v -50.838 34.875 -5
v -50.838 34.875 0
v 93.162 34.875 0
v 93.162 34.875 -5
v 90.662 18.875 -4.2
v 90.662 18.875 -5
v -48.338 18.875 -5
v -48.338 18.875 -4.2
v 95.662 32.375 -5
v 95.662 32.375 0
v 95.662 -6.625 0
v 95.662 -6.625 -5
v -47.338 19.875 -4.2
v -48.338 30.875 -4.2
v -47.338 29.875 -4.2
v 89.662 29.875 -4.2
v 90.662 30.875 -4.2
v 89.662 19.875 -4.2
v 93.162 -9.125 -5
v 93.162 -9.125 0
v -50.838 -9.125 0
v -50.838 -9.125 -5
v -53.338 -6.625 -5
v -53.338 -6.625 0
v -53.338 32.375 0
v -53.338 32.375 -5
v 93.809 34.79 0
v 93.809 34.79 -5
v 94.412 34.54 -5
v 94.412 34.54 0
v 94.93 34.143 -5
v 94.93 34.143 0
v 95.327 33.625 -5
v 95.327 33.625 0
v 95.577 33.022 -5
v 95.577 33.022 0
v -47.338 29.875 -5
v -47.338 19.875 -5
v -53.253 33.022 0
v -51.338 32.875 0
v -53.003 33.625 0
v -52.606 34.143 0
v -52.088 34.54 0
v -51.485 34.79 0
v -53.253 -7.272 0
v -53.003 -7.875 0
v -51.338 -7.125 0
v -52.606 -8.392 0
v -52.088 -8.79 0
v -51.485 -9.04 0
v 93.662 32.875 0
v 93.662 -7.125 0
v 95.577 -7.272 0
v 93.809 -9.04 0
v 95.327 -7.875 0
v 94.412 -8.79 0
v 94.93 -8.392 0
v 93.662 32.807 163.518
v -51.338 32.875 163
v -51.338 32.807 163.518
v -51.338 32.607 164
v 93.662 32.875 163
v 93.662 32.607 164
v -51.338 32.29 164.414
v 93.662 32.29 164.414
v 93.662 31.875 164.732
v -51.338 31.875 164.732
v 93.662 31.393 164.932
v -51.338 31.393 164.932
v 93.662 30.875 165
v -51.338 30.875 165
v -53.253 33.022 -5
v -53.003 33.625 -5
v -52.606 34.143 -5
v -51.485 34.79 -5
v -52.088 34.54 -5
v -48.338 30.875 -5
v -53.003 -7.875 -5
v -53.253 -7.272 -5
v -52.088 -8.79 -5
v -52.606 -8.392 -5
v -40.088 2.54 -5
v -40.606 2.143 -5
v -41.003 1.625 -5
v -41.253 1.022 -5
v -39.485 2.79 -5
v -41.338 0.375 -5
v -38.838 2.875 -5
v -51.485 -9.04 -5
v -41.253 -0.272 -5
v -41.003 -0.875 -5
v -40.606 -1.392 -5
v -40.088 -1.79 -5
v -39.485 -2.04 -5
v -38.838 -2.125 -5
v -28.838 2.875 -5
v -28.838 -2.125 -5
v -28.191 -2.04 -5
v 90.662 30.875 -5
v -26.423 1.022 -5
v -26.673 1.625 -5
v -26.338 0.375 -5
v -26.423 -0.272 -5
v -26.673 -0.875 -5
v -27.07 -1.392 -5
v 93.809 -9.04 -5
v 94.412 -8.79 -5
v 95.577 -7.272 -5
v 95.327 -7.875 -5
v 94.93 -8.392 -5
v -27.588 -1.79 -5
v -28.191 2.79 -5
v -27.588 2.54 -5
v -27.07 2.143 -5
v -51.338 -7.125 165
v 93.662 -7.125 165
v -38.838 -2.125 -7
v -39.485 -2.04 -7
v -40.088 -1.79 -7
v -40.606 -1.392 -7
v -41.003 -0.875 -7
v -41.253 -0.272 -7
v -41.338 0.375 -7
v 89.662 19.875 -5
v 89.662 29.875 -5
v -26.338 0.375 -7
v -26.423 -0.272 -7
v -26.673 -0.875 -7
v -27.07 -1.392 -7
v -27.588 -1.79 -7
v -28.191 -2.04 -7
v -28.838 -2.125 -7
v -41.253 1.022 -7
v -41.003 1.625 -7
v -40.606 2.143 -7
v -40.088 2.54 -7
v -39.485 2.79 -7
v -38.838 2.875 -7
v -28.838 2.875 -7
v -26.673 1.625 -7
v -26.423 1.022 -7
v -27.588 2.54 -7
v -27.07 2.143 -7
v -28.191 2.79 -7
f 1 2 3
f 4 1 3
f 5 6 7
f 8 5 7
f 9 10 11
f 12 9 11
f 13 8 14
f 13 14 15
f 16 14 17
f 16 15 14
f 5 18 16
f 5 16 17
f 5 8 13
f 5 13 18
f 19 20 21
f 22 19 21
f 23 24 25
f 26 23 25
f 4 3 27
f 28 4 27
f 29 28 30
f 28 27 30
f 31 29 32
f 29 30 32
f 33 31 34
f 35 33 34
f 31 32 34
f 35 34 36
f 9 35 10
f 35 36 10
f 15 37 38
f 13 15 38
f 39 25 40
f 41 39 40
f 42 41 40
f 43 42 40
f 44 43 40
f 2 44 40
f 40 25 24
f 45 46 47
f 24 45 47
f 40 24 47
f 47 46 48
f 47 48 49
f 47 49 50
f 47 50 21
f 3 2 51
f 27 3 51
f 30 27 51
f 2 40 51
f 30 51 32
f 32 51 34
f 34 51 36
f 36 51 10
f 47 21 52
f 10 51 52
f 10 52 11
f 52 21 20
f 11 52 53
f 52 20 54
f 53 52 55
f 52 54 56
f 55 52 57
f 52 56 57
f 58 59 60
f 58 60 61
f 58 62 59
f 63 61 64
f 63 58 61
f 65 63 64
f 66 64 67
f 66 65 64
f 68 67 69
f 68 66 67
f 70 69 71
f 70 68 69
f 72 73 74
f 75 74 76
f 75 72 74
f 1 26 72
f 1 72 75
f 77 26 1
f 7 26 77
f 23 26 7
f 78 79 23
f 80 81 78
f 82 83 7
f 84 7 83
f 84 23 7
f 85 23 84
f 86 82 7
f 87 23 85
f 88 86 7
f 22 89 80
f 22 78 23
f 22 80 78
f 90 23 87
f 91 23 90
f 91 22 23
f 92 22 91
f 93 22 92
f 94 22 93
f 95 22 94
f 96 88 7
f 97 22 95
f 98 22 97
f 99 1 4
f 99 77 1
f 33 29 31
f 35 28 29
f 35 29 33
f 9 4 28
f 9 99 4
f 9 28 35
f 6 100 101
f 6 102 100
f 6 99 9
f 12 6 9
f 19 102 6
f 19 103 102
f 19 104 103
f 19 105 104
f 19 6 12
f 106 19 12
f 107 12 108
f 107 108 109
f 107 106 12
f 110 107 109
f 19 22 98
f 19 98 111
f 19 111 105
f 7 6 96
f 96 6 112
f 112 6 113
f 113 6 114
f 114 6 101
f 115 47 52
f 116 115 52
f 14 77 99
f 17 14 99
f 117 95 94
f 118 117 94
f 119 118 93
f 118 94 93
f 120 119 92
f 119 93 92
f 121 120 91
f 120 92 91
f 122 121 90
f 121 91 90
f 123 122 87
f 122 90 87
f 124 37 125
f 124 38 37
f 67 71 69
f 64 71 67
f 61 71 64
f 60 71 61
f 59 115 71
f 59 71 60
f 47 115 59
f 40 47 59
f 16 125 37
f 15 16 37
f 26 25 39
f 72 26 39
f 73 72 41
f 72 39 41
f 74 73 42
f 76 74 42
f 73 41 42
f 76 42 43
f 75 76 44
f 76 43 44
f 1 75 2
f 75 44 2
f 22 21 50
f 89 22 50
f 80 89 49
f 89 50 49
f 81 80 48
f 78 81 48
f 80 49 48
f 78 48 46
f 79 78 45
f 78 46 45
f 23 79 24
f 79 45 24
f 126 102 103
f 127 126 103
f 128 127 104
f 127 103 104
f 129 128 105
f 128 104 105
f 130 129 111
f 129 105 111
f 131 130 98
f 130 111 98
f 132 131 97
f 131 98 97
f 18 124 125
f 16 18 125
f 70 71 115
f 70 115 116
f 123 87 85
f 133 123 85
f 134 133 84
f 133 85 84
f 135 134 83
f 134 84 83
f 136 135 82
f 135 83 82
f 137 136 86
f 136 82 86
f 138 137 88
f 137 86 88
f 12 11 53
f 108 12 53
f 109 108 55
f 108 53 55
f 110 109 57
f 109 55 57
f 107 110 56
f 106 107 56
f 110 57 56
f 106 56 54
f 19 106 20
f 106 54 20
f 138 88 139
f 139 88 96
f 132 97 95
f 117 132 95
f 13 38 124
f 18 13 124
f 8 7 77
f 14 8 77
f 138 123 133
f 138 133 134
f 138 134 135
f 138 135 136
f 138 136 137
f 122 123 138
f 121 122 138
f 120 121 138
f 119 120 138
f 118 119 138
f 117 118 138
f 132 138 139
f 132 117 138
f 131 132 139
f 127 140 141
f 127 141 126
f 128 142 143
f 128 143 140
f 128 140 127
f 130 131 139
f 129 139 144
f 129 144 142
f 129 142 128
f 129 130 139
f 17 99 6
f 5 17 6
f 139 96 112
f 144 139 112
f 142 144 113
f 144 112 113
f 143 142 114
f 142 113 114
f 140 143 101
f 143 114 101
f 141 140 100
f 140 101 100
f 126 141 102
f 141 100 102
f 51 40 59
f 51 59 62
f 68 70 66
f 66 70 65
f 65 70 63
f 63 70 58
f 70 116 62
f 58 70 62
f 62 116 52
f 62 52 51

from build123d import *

# Parameters (mm, degrees)
F0_W     = 145
F0_H     = 40
F1_DEPTH = 165
F2_R     = 2
F4_DEPTH = 5
F6_DEPTH = 0.2
F7_DEPTH = 1
F9_DEPTH = 2


with BuildPart() as f1:
    # F0 (on Top) → F1 (new body)
    with BuildSketch(Plane.XY):
        with Locations((21.1617818475, 12.8752994537)):
            Rectangle(F0_W, F0_H)
    extrude(amount=F1_DEPTH)

    # F2
    f2_edges = [f1.edges().sort_by_distance(p)[0] for p in [
        (21.161782, 32.875299, 165),
    ]]
    fillet(f2_edges, radius=F2_R)

    # F3 (on face) → F4 (join)
    with BuildSketch(Plane(origin=(0, 0, 0), x_dir=(1, 0, 0), z_dir=(0, 0, -1))):
        with BuildLine():
            Line((-53.3382181525, 6.6247005463), (-53.3382181525, -12.8752994537))
            Line((-53.3382181525, -12.8752994537), (-53.3382181525, -32.3752994537))
            ThreePointArc((-53.3382181525, -32.3752994537), (-52.6059851055, -34.1430664067), (-50.8382181525, -34.8752994537))
            Line((-50.8382181525, -34.8752994537), (45.6353314221, -34.8752994537))
            Line((45.6353314221, -34.8752994537), (93.1617818475, -34.8752994537))
            ThreePointArc((93.1617818475, -34.8752994537), (94.9295488004, -34.1430664067), (95.6617818475, -32.3752994537))
            Line((95.6617818475, -32.3752994537), (95.6617818475, -12.8752994537))
            Line((95.6617818475, -12.8752994537), (95.6617818475, 6.6247005463))
            ThreePointArc((95.6617818475, 6.6247005463), (94.9295488004, 8.3924674992), (93.1617818475, 9.1247005463))
            Line((93.1617818475, 9.1247005463), (22.451678291, 9.1247005463))
            Line((22.451678291, 9.1247005463), (-50.8382181525, 9.1247005463))
            ThreePointArc((-50.8382181525, 9.1247005463), (-52.6059851055, 8.3924674992), (-53.3382181525, 6.6247005463))
        make_face()
    extrude(amount=F4_DEPTH)

    # F5 (on face) → F6 (join)
    with BuildSketch(Plane(origin=(0, 0, -5), x_dir=(1, 0, 0), z_dir=(0, 0, -1))):
        Polygon((-48.3382181525, -30.8752994537), (29.9128331244, -30.8752994537), (41.8360643089, -30.8752994537), (41.8360643089, -29.8752994537), (-47.3382181525, -29.8752994537), (-47.3382181525, -24.8752994537), (-48.3382181525, -24.8752994537), align=None)
        Polygon((41.8360643089, -29.8752994537), (41.8360643089, -30.8752994537), (90.6617818475, -30.8752994537), (90.6617818475, -27.4621471763), (90.6617818475, -24.8752994537), (89.6617818475, -24.8752994537), (89.6617818475, -29.8752994537), align=None)
        Polygon((-48.3382181525, -20.8752994537), (-48.3382181525, -24.8752994537), (-47.3382181525, -24.8752994537), (-47.3382181525, -19.8752994537), (26.0328520089, -19.8752994537), (26.0328520089, -18.8752994537), (-48.3382181525, -18.8752994537), align=None)
        Polygon((89.6617818475, -24.8752994537), (90.6617818475, -24.8752994537), (90.6617818475, -18.8752994537), (26.0328520089, -18.8752994537), (26.0328520089, -19.8752994537), (89.6617818475, -19.8752994537), align=None)
    extrude(amount=F6_DEPTH)

    # F7 (cut): a face of the model
    f7_faces = [f1.faces().sort_by_distance(p)[0] for p in [
        (21.1617818475, 30.7357824297, -5.2),
    ]]
    extrude(f7_faces, amount=-F7_DEPTH, mode=Mode.SUBTRACT)

    # F8 (on face) → F9 (join)
    with BuildSketch(Plane(origin=(0, 0, -5), x_dir=(1, 0, 0), z_dir=(0, 0, -1))):
        with BuildLine():
            ThreePointArc((-41.3382181525, -0.3752994537), (-40.6059851055, -2.1430664067), (-38.8382181525, -2.8752994537))
            Line((-38.8382181525, -2.8752994537), (-28.8382181525, -2.8752994537))
            ThreePointArc((-28.8382181525, -2.8752994537), (-27.0704511996, -2.1430664067), (-26.3382181525, -0.3752994537))
            ThreePointArc((-26.3382181525, -0.3752994537), (-27.0704511996, 1.3924674992), (-28.8382181525, 2.1247005463))
            Line((-28.8382181525, 2.1247005463), (-38.8382181525, 2.1247005463))
            ThreePointArc((-38.8382181525, 2.1247005463), (-40.6059851055, 1.3924674992), (-41.3382181525, -0.3752994537))
        make_face()
    extrude(amount=F9_DEPTH)


solid = f1.part
